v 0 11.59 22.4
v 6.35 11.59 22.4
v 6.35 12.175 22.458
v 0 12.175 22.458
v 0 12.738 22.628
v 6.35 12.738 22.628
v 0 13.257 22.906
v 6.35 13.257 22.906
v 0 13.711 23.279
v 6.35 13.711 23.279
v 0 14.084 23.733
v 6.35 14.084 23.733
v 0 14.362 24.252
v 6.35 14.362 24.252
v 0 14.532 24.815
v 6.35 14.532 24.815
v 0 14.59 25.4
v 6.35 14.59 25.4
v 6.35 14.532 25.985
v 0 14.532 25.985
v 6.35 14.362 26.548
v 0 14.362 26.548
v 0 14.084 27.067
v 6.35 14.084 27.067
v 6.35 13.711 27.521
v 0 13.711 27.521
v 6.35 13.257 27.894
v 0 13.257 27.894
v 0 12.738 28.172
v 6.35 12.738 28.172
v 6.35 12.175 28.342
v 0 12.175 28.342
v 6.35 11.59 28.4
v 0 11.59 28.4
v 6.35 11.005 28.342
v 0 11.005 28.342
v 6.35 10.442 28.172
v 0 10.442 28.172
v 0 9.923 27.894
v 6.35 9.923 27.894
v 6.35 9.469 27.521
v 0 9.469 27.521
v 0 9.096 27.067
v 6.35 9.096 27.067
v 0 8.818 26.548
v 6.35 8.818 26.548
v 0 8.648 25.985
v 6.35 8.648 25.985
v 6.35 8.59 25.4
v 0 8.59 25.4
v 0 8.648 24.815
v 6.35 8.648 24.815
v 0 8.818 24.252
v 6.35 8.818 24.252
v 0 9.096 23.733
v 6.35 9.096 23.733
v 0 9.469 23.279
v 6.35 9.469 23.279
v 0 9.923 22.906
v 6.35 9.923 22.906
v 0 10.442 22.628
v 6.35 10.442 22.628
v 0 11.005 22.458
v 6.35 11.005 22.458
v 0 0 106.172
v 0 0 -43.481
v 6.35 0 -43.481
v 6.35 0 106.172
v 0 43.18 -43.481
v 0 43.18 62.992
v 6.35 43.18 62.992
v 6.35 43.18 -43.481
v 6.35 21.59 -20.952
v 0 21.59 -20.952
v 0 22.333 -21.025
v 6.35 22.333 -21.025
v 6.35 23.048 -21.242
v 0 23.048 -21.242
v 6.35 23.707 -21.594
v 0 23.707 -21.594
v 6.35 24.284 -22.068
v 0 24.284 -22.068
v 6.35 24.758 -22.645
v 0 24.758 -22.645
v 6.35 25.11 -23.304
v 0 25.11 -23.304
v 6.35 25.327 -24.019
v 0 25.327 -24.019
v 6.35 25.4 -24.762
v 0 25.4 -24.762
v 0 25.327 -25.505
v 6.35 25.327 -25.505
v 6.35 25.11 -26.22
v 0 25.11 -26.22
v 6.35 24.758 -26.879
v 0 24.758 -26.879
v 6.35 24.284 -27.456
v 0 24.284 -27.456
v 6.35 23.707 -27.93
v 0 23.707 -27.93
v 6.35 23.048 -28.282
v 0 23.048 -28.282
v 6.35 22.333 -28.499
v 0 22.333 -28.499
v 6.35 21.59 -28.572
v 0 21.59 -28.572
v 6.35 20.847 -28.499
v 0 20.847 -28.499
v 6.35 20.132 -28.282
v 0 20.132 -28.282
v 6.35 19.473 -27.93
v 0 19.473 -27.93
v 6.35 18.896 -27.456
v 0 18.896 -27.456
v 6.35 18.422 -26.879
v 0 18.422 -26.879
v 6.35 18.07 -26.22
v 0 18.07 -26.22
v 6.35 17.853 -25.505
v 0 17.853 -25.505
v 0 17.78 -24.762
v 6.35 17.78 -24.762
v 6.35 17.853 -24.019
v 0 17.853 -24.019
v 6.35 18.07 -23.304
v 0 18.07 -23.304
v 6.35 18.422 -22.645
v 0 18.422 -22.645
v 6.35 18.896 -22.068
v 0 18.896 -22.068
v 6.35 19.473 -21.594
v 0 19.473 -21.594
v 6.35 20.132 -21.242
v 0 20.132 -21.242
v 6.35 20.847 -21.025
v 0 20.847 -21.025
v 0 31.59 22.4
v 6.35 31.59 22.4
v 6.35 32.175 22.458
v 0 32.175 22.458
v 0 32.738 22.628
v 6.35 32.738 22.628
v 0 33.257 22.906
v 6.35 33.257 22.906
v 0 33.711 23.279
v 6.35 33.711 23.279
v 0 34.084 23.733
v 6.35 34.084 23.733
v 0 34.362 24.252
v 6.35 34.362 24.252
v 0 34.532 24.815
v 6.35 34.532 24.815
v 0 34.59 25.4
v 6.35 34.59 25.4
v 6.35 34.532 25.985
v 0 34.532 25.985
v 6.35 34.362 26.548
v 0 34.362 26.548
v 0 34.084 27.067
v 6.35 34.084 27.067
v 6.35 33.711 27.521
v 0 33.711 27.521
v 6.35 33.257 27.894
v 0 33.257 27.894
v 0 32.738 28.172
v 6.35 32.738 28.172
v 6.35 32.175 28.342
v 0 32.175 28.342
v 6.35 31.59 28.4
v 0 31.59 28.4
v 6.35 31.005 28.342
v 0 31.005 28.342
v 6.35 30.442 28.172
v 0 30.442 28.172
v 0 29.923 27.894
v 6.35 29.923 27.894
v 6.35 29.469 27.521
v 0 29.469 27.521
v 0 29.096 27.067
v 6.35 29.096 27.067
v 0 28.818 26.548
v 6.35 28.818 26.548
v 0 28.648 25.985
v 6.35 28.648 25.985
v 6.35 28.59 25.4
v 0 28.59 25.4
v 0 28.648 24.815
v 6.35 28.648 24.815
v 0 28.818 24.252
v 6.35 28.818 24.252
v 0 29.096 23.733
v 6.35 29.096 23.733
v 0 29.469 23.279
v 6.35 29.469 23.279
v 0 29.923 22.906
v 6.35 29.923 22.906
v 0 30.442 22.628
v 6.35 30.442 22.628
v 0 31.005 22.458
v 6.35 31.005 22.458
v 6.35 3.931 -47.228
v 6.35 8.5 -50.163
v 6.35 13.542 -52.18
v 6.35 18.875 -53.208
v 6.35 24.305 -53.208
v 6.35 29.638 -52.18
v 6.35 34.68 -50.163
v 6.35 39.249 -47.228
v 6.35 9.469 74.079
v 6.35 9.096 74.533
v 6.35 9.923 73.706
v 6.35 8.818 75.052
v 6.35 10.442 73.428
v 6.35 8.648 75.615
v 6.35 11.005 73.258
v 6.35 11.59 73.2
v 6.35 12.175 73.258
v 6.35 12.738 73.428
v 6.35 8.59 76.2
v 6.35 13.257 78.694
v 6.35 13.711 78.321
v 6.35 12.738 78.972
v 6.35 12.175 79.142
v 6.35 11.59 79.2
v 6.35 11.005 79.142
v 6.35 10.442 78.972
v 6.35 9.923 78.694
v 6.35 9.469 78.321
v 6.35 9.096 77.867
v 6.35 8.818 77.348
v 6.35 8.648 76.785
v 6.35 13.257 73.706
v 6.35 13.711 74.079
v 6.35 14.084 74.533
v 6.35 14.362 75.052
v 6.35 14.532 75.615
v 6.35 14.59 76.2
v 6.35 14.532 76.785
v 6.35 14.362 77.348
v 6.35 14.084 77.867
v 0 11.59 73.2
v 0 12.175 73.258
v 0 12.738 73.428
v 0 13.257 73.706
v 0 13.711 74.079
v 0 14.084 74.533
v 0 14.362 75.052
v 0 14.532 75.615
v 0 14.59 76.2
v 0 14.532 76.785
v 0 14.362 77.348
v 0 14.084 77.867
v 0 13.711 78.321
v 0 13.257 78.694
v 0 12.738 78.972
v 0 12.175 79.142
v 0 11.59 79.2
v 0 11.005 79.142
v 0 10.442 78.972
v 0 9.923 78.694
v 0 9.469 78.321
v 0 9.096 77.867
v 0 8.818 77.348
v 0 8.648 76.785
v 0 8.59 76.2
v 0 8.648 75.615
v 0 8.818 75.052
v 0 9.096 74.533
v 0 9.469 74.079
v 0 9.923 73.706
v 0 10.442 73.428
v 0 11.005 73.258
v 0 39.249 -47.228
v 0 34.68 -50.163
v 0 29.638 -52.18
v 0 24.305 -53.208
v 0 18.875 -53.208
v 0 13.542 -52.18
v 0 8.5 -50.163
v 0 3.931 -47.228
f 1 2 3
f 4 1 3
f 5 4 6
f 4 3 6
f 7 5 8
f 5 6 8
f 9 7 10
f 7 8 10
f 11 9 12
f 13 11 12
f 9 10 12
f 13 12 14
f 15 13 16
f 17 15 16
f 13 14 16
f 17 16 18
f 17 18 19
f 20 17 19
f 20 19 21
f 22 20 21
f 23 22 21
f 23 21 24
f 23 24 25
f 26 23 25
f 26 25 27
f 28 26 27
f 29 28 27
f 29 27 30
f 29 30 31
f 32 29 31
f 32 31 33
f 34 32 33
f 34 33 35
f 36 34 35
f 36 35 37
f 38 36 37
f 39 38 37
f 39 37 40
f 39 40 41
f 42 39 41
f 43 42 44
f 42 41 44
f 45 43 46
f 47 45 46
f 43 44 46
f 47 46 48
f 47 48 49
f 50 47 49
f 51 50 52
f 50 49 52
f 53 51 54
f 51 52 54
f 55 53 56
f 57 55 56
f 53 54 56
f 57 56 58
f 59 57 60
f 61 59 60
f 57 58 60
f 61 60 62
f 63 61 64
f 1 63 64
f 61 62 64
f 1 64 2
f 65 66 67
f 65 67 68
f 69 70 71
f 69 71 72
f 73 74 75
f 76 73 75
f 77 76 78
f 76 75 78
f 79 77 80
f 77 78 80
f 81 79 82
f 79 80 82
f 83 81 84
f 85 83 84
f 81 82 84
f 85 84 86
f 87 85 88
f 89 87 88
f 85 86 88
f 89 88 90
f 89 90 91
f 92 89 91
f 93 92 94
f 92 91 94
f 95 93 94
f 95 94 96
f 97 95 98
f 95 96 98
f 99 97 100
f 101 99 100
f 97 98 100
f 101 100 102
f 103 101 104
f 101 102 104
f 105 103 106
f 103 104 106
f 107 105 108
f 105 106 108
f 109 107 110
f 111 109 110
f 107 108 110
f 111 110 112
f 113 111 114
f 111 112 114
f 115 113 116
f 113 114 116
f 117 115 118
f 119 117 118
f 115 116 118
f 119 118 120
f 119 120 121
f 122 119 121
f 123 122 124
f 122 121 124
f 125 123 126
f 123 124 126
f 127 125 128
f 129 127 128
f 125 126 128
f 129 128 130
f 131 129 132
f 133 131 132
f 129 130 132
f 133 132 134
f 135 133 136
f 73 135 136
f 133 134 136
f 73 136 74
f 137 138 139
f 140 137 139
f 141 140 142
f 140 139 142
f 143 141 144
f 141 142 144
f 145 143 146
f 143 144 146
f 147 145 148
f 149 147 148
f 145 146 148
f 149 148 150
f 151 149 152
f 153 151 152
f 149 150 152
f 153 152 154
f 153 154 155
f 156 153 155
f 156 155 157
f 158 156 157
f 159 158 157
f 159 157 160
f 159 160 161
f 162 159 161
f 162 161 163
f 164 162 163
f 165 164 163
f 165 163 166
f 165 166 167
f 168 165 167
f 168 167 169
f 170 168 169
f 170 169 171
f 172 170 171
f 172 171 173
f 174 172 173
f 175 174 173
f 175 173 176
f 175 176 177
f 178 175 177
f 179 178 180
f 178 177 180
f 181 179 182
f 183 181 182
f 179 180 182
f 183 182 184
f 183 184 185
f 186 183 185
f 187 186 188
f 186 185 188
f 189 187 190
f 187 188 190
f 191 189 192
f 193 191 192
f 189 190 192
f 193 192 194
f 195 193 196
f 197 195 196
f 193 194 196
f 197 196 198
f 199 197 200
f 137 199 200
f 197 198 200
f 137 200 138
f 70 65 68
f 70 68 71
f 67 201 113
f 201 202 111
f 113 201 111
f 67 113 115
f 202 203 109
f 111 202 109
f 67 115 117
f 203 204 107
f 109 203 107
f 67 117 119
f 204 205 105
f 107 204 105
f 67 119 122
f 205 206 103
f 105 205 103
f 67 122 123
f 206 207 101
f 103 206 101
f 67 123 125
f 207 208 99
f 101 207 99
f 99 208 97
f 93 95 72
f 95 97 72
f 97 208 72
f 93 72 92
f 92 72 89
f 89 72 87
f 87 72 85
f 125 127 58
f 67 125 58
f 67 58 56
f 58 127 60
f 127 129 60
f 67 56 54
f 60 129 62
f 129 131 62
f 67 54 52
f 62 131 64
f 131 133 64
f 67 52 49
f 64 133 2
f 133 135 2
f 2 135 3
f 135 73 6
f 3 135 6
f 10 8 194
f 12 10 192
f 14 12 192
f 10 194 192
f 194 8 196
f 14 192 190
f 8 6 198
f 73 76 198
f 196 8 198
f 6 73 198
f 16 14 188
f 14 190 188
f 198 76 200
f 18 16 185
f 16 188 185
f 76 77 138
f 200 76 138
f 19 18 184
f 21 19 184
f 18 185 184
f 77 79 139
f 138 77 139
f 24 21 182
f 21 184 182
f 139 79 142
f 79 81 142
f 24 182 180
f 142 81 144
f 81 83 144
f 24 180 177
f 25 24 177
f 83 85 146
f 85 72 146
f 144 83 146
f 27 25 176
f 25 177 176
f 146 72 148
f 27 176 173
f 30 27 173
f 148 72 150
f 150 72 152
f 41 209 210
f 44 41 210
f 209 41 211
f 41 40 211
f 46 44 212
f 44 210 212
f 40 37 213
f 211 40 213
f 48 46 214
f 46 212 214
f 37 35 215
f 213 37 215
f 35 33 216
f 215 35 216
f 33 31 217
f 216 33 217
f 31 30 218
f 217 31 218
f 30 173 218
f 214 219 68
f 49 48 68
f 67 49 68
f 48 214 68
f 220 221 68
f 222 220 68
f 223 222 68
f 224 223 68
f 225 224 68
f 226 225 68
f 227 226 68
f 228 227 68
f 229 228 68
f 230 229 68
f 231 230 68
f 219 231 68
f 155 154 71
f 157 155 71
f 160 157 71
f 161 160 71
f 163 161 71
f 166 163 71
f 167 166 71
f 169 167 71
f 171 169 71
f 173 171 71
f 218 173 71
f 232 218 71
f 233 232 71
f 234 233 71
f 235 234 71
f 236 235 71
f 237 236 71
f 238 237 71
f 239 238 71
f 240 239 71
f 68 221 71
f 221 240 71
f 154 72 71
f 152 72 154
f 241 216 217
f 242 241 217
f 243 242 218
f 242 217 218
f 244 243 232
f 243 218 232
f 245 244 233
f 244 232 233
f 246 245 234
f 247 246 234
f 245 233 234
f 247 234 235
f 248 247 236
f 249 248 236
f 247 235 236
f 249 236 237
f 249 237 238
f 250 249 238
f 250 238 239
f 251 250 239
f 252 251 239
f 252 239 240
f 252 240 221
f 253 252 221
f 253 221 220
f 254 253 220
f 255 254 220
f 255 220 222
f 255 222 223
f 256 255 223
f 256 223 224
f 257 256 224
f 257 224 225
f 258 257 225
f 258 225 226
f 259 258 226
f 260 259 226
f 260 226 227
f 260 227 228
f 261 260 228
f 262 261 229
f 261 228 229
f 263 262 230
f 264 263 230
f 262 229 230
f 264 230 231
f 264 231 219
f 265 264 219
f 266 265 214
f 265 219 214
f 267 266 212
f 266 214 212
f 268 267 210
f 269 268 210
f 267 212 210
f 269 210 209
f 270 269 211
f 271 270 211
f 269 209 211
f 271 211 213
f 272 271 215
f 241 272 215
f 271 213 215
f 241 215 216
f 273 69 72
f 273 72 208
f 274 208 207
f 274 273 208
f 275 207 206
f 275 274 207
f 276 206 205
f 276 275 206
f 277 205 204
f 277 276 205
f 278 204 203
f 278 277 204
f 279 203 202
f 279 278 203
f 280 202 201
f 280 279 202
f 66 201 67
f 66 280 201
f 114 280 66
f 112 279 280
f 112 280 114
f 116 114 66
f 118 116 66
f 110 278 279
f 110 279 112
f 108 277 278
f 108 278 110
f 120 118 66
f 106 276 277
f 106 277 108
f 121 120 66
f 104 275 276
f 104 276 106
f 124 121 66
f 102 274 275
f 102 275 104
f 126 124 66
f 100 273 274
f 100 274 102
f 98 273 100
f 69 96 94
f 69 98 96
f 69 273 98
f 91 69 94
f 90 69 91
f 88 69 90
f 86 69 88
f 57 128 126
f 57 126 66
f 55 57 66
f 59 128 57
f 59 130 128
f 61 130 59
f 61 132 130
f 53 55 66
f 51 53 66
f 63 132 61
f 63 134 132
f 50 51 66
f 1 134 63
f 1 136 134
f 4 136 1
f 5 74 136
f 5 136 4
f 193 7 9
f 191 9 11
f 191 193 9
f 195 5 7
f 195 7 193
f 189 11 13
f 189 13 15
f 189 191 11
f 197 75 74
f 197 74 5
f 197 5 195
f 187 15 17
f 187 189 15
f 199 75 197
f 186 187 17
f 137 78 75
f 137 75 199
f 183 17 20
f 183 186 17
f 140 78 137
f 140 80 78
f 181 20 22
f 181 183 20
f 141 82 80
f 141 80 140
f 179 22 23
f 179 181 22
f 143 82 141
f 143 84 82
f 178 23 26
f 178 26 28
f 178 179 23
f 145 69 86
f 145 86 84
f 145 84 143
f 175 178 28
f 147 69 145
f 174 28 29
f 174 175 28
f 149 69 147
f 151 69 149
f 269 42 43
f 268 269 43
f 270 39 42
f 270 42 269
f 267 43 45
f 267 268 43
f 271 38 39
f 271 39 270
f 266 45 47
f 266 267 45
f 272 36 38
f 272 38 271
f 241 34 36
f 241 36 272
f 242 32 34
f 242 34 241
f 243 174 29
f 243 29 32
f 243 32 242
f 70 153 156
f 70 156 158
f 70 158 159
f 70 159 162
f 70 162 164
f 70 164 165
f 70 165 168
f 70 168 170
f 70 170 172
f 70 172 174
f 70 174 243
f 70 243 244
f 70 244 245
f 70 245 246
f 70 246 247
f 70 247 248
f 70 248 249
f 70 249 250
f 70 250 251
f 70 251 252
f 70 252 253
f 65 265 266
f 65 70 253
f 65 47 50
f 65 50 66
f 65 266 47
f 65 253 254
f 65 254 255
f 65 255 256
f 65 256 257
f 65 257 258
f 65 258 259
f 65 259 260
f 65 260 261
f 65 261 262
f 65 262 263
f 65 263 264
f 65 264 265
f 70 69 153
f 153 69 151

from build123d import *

# Parameters (mm, degrees)
BOSS_EXTRUDE1_DEPTH = 6.35
BOSS_EXTRUDE2_DEPTH = 6.35
CUT_EXTRUDE1_DEPTH  = 176.195383741
SKETCH4_R           = 3
CUT_EXTRUDE2_DEPTH  = 169.439588188
CUT_EXTRUDE3_DEPTH  = 6.35
SKETCH7_R           = 3.81
BOSS_EXTRUDE3_DEPTH = 6.35


with BuildPart() as part:
    # Sketch1 → Boss-Extrude1 (new body)
    with BuildSketch(Plane(origin=(0, 0, 0), x_dir=(0, 0, -1), z_dir=(1, 0, 0))):
        with BuildLine():
            Line((-106.172, 0), (-62.992, 43.18))
            Line((-62.992, 43.18), (0, 43.18))
            Line((0, 43.18), (0, 40.64))
            ThreePointArc((0, 40.64), (-6.479930943, 21.59), (0, 2.54))
            Line((0, 2.54), (0, 0))
            Line((0, 0), (-106.172, 0))
        make_face()
    extrude(amount=BOSS_EXTRUDE1_DEPTH)

    # Sketch2 → Boss-Extrude2 (add)
    with BuildSketch(Plane(origin=(6.35, 0, 0), x_dir=(0, 0, -1), z_dir=(1, 0, 0))):
        Polygon((-68.072, 0), (-169.672, 0), (-144.272, 10.16), (-68.072, 17.78), align=None)
    extrude(amount=-BOSS_EXTRUDE2_DEPTH)

    # Sketch3 → Cut-Extrude1 (cut, through all)
    with BuildSketch(Plane(origin=(6.35, 0, 0), x_dir=(0, 0, -1), z_dir=(1, 0, 0))):
        Polygon((-106.172, 0), (-162.687, 2.794), (-169.672, 0), align=None)
    extrude(amount=-CUT_EXTRUDE1_DEPTH, mode=Mode.SUBTRACT)

    # Sketch4 → Cut-Extrude2 (cut, through all)
    with BuildSketch(Plane(origin=(6.35, 0, 0), x_dir=(0, 0, -1), z_dir=(1, 0, 0))):
        with Locations((-25.4, 31.59)):
            Circle(SKETCH4_R)
        with Locations((-25.4, 11.59)):
            Circle(SKETCH4_R)
        with Locations((-76.2, 11.59)):
            Circle(SKETCH4_R)
    extrude(amount=-CUT_EXTRUDE2_DEPTH, mode=Mode.SUBTRACT)

    # Sketch6 → Cut-Extrude3 (cut)
    with BuildSketch(Plane.ZY):
        Polygon((62.992, 43.18), (90.649777778, 15.522222222), (108.309937594, -2.137937594), (165.318856779, -0.913782118), (157.233600138, 13.290047118), (95.237394621, 20.109839066), align=None)
    extrude(amount=-CUT_EXTRUDE3_DEPTH, mode=Mode.SUBTRACT)

    # Sketch7 → Boss-Extrude3 (add)
    with BuildSketch(Plane.ZY):
        with BuildLine():
            Line((0, 43.18), (-43.481110833, 43.18))
            ThreePointArc((-43.481110833, 43.18), (-53.337069057, 21.59), (-43.481110833, 0))
            Line((-43.481110833, 0), (0, 0))
            Line((0, 0), (0, 2.54))
            ThreePointArc((0, 2.54), (6.479930943, 21.59), (0, 40.64))
            Line((0, 40.64), (0, 43.18))
        make_face()
        with Locations((-24.762069057, 21.59)):
            Circle(SKETCH7_R, mode=Mode.SUBTRACT)
    extrude(amount=-BOSS_EXTRUDE3_DEPTH)


solid = part.part
